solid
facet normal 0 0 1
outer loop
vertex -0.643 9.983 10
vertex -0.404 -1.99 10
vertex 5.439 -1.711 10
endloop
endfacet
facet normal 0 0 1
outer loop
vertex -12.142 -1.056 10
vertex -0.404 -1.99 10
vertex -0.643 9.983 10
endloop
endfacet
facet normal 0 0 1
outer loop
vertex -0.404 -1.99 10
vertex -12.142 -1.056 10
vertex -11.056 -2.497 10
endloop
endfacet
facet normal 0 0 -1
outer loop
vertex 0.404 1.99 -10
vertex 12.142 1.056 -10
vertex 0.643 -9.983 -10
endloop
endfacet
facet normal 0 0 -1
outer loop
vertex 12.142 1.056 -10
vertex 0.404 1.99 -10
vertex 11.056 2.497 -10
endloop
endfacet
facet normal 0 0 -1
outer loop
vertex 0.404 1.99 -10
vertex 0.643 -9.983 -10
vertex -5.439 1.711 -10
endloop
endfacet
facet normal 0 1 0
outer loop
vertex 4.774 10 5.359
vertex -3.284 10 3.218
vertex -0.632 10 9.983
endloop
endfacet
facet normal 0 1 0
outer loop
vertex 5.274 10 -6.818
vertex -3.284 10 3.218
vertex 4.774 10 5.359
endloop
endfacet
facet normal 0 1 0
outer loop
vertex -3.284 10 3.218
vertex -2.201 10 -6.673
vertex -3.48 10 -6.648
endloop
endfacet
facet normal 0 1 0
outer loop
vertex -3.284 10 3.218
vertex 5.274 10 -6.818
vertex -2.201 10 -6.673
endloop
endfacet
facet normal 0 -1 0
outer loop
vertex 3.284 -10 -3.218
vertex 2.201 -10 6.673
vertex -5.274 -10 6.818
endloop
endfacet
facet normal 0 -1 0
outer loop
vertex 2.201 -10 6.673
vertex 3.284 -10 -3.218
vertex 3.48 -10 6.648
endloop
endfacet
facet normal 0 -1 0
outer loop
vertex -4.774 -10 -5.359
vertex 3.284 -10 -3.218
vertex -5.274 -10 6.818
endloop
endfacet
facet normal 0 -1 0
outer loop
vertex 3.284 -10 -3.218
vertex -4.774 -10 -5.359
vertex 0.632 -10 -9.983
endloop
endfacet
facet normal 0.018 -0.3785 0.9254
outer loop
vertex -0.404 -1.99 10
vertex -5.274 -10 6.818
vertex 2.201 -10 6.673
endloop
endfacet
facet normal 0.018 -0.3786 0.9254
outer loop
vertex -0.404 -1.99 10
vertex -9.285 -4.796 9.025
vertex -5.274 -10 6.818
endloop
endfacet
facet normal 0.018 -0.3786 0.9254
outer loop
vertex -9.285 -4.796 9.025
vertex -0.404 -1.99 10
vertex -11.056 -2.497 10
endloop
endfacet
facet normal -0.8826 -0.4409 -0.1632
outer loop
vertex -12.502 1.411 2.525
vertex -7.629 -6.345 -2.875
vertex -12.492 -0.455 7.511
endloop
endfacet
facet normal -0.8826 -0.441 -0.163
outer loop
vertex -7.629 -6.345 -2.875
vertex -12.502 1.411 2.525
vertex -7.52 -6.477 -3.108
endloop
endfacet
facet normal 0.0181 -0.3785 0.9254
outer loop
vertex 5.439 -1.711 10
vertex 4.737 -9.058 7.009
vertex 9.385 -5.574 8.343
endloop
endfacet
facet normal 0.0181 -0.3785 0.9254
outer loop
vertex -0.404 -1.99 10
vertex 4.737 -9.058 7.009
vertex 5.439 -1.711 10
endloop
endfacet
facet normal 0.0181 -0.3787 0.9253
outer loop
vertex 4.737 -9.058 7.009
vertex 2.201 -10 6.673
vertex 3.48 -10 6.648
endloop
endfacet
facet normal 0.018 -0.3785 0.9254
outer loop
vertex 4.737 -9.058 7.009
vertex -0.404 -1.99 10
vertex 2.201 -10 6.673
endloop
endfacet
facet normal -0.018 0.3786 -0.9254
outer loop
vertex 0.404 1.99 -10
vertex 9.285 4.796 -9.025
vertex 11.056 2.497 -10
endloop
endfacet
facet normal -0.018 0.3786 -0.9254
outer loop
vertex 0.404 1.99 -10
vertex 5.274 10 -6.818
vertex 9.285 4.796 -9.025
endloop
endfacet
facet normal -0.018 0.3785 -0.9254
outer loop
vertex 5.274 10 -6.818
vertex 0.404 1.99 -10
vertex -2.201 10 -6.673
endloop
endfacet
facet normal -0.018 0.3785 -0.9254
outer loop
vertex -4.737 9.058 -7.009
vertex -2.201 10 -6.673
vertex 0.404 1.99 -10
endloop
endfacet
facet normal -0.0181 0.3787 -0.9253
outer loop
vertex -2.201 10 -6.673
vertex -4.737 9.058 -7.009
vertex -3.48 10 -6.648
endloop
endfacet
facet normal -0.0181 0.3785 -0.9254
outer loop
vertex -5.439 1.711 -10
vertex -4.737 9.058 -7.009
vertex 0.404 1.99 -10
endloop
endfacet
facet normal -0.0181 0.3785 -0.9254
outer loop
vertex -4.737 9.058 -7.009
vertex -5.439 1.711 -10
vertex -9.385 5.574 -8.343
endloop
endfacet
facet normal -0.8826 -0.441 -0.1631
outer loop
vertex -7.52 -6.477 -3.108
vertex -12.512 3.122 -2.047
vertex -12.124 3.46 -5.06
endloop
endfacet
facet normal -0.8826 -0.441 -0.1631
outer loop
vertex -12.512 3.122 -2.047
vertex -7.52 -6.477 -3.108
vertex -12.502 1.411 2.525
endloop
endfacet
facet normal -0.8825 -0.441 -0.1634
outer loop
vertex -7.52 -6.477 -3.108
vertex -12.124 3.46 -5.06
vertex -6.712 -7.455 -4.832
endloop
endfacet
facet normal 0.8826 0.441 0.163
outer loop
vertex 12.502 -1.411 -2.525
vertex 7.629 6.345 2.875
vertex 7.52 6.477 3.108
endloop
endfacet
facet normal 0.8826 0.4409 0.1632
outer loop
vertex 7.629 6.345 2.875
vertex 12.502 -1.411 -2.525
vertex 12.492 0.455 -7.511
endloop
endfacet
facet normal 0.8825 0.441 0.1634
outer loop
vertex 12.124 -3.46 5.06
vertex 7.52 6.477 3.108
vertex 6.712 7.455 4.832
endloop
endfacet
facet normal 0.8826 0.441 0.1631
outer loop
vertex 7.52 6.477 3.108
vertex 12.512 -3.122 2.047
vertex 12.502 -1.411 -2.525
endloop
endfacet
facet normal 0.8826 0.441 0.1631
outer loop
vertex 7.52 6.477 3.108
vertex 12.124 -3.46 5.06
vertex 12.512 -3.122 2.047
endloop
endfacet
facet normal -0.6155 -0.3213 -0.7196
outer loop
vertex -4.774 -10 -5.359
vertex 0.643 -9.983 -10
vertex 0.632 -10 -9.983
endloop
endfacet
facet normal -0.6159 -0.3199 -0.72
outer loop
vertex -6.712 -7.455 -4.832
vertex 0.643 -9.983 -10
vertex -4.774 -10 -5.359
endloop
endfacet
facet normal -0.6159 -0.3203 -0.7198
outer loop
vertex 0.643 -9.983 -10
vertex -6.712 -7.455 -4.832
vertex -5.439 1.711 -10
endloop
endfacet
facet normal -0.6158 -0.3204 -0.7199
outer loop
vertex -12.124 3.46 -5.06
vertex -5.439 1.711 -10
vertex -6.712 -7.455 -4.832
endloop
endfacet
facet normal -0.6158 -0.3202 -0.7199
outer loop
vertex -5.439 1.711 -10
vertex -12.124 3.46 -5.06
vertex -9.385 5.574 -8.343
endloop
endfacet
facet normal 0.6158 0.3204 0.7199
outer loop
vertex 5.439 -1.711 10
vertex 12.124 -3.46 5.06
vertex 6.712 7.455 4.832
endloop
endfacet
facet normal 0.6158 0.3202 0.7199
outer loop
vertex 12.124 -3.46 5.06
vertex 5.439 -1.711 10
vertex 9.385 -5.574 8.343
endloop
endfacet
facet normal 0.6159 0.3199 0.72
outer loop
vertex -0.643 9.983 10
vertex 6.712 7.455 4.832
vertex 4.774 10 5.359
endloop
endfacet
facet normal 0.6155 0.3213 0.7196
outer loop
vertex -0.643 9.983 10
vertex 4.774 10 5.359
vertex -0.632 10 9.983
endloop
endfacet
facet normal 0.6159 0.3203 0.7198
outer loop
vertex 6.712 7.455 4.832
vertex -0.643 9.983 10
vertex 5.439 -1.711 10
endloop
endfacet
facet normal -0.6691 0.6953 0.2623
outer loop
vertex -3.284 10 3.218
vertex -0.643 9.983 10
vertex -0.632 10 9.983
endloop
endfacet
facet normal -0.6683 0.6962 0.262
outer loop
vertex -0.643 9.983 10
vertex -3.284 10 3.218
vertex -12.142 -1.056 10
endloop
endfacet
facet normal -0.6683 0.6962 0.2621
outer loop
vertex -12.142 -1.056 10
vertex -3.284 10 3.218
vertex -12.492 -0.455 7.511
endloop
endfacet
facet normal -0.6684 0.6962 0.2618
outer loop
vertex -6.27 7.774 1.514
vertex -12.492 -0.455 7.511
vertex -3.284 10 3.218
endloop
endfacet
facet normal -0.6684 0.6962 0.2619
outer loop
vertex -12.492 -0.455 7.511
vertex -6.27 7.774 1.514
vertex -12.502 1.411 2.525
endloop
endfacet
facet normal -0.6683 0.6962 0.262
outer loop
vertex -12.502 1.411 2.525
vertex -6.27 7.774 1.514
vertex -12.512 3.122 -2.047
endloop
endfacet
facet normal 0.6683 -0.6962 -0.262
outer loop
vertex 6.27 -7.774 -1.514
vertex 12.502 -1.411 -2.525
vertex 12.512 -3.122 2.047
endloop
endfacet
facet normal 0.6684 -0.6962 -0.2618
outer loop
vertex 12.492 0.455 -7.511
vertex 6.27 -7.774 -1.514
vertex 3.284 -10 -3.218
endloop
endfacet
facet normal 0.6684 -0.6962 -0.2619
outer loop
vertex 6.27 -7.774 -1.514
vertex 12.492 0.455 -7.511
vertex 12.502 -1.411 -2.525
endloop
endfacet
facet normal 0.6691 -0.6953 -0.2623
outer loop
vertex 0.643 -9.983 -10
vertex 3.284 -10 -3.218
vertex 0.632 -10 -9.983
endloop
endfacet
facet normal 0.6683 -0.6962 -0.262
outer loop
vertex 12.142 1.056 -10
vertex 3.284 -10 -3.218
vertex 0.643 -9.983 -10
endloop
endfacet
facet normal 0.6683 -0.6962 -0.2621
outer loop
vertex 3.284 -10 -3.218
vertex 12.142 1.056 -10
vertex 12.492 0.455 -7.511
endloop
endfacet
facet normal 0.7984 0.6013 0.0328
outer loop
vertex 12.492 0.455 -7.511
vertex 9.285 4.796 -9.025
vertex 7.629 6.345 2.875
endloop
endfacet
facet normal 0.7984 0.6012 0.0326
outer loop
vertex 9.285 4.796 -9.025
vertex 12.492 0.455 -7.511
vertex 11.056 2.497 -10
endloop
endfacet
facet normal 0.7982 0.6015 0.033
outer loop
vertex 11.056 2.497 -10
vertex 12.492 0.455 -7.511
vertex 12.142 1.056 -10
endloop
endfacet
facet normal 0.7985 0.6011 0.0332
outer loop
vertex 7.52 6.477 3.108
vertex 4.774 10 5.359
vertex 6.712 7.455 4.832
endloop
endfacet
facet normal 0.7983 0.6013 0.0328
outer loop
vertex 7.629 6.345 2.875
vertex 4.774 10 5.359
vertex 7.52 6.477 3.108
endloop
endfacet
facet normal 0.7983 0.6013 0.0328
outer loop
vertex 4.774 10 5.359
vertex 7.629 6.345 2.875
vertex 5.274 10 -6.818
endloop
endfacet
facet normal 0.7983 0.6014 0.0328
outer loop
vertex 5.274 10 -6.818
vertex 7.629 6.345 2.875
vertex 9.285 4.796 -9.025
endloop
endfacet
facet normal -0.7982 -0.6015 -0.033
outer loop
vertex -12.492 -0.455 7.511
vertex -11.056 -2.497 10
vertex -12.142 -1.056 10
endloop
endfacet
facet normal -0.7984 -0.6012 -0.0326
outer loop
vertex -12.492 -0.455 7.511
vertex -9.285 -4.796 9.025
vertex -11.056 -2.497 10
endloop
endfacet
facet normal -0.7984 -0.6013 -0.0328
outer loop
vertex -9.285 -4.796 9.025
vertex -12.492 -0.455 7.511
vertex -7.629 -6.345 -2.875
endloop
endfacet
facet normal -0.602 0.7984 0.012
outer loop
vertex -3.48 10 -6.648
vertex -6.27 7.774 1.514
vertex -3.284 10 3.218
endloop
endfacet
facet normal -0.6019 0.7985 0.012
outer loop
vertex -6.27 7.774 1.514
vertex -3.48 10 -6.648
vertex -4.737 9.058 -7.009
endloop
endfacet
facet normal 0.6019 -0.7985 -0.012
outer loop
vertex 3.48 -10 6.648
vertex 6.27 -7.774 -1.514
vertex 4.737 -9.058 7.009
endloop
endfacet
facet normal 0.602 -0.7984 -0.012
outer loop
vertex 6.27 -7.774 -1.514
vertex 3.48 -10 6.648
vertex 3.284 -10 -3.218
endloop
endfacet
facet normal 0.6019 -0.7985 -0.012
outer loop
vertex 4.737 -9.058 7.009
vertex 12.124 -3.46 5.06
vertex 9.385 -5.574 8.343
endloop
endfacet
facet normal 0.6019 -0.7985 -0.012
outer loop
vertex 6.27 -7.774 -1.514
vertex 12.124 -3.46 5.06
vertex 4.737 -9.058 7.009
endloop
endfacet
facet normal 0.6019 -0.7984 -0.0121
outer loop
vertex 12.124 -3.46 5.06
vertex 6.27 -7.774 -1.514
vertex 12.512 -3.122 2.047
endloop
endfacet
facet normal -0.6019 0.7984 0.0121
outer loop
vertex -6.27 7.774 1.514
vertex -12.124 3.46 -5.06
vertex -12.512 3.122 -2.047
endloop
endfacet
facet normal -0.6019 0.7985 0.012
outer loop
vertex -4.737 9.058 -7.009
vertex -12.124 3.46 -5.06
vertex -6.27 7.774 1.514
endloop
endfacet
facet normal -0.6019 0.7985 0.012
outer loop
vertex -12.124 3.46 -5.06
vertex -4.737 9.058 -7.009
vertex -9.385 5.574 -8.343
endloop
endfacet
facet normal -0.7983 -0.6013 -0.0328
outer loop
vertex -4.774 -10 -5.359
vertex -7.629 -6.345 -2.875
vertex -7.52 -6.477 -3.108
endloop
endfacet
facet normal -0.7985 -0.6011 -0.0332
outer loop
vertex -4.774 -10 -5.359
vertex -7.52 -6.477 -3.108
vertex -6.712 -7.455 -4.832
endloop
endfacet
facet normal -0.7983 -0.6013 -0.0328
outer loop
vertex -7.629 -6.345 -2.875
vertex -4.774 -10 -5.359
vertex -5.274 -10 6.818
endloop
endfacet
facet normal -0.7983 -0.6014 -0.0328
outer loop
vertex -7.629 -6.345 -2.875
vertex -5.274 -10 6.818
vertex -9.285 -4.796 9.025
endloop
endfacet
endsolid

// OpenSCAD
intersection(){intersection(){intersection(){rotate(a = [0, 0, 0])
cube(size = [100, 20, 20], center = true);
rotate(a = [10, 20, 300])
cube(size = [100, 20, 20], center = true);
}
rotate(a = [200, 40, 57])
cube(size = [100, 20, 20], center = true);
}
rotate(a = [20, 88, 57])
cube(size = [100, 20, 20], center = true);
}
